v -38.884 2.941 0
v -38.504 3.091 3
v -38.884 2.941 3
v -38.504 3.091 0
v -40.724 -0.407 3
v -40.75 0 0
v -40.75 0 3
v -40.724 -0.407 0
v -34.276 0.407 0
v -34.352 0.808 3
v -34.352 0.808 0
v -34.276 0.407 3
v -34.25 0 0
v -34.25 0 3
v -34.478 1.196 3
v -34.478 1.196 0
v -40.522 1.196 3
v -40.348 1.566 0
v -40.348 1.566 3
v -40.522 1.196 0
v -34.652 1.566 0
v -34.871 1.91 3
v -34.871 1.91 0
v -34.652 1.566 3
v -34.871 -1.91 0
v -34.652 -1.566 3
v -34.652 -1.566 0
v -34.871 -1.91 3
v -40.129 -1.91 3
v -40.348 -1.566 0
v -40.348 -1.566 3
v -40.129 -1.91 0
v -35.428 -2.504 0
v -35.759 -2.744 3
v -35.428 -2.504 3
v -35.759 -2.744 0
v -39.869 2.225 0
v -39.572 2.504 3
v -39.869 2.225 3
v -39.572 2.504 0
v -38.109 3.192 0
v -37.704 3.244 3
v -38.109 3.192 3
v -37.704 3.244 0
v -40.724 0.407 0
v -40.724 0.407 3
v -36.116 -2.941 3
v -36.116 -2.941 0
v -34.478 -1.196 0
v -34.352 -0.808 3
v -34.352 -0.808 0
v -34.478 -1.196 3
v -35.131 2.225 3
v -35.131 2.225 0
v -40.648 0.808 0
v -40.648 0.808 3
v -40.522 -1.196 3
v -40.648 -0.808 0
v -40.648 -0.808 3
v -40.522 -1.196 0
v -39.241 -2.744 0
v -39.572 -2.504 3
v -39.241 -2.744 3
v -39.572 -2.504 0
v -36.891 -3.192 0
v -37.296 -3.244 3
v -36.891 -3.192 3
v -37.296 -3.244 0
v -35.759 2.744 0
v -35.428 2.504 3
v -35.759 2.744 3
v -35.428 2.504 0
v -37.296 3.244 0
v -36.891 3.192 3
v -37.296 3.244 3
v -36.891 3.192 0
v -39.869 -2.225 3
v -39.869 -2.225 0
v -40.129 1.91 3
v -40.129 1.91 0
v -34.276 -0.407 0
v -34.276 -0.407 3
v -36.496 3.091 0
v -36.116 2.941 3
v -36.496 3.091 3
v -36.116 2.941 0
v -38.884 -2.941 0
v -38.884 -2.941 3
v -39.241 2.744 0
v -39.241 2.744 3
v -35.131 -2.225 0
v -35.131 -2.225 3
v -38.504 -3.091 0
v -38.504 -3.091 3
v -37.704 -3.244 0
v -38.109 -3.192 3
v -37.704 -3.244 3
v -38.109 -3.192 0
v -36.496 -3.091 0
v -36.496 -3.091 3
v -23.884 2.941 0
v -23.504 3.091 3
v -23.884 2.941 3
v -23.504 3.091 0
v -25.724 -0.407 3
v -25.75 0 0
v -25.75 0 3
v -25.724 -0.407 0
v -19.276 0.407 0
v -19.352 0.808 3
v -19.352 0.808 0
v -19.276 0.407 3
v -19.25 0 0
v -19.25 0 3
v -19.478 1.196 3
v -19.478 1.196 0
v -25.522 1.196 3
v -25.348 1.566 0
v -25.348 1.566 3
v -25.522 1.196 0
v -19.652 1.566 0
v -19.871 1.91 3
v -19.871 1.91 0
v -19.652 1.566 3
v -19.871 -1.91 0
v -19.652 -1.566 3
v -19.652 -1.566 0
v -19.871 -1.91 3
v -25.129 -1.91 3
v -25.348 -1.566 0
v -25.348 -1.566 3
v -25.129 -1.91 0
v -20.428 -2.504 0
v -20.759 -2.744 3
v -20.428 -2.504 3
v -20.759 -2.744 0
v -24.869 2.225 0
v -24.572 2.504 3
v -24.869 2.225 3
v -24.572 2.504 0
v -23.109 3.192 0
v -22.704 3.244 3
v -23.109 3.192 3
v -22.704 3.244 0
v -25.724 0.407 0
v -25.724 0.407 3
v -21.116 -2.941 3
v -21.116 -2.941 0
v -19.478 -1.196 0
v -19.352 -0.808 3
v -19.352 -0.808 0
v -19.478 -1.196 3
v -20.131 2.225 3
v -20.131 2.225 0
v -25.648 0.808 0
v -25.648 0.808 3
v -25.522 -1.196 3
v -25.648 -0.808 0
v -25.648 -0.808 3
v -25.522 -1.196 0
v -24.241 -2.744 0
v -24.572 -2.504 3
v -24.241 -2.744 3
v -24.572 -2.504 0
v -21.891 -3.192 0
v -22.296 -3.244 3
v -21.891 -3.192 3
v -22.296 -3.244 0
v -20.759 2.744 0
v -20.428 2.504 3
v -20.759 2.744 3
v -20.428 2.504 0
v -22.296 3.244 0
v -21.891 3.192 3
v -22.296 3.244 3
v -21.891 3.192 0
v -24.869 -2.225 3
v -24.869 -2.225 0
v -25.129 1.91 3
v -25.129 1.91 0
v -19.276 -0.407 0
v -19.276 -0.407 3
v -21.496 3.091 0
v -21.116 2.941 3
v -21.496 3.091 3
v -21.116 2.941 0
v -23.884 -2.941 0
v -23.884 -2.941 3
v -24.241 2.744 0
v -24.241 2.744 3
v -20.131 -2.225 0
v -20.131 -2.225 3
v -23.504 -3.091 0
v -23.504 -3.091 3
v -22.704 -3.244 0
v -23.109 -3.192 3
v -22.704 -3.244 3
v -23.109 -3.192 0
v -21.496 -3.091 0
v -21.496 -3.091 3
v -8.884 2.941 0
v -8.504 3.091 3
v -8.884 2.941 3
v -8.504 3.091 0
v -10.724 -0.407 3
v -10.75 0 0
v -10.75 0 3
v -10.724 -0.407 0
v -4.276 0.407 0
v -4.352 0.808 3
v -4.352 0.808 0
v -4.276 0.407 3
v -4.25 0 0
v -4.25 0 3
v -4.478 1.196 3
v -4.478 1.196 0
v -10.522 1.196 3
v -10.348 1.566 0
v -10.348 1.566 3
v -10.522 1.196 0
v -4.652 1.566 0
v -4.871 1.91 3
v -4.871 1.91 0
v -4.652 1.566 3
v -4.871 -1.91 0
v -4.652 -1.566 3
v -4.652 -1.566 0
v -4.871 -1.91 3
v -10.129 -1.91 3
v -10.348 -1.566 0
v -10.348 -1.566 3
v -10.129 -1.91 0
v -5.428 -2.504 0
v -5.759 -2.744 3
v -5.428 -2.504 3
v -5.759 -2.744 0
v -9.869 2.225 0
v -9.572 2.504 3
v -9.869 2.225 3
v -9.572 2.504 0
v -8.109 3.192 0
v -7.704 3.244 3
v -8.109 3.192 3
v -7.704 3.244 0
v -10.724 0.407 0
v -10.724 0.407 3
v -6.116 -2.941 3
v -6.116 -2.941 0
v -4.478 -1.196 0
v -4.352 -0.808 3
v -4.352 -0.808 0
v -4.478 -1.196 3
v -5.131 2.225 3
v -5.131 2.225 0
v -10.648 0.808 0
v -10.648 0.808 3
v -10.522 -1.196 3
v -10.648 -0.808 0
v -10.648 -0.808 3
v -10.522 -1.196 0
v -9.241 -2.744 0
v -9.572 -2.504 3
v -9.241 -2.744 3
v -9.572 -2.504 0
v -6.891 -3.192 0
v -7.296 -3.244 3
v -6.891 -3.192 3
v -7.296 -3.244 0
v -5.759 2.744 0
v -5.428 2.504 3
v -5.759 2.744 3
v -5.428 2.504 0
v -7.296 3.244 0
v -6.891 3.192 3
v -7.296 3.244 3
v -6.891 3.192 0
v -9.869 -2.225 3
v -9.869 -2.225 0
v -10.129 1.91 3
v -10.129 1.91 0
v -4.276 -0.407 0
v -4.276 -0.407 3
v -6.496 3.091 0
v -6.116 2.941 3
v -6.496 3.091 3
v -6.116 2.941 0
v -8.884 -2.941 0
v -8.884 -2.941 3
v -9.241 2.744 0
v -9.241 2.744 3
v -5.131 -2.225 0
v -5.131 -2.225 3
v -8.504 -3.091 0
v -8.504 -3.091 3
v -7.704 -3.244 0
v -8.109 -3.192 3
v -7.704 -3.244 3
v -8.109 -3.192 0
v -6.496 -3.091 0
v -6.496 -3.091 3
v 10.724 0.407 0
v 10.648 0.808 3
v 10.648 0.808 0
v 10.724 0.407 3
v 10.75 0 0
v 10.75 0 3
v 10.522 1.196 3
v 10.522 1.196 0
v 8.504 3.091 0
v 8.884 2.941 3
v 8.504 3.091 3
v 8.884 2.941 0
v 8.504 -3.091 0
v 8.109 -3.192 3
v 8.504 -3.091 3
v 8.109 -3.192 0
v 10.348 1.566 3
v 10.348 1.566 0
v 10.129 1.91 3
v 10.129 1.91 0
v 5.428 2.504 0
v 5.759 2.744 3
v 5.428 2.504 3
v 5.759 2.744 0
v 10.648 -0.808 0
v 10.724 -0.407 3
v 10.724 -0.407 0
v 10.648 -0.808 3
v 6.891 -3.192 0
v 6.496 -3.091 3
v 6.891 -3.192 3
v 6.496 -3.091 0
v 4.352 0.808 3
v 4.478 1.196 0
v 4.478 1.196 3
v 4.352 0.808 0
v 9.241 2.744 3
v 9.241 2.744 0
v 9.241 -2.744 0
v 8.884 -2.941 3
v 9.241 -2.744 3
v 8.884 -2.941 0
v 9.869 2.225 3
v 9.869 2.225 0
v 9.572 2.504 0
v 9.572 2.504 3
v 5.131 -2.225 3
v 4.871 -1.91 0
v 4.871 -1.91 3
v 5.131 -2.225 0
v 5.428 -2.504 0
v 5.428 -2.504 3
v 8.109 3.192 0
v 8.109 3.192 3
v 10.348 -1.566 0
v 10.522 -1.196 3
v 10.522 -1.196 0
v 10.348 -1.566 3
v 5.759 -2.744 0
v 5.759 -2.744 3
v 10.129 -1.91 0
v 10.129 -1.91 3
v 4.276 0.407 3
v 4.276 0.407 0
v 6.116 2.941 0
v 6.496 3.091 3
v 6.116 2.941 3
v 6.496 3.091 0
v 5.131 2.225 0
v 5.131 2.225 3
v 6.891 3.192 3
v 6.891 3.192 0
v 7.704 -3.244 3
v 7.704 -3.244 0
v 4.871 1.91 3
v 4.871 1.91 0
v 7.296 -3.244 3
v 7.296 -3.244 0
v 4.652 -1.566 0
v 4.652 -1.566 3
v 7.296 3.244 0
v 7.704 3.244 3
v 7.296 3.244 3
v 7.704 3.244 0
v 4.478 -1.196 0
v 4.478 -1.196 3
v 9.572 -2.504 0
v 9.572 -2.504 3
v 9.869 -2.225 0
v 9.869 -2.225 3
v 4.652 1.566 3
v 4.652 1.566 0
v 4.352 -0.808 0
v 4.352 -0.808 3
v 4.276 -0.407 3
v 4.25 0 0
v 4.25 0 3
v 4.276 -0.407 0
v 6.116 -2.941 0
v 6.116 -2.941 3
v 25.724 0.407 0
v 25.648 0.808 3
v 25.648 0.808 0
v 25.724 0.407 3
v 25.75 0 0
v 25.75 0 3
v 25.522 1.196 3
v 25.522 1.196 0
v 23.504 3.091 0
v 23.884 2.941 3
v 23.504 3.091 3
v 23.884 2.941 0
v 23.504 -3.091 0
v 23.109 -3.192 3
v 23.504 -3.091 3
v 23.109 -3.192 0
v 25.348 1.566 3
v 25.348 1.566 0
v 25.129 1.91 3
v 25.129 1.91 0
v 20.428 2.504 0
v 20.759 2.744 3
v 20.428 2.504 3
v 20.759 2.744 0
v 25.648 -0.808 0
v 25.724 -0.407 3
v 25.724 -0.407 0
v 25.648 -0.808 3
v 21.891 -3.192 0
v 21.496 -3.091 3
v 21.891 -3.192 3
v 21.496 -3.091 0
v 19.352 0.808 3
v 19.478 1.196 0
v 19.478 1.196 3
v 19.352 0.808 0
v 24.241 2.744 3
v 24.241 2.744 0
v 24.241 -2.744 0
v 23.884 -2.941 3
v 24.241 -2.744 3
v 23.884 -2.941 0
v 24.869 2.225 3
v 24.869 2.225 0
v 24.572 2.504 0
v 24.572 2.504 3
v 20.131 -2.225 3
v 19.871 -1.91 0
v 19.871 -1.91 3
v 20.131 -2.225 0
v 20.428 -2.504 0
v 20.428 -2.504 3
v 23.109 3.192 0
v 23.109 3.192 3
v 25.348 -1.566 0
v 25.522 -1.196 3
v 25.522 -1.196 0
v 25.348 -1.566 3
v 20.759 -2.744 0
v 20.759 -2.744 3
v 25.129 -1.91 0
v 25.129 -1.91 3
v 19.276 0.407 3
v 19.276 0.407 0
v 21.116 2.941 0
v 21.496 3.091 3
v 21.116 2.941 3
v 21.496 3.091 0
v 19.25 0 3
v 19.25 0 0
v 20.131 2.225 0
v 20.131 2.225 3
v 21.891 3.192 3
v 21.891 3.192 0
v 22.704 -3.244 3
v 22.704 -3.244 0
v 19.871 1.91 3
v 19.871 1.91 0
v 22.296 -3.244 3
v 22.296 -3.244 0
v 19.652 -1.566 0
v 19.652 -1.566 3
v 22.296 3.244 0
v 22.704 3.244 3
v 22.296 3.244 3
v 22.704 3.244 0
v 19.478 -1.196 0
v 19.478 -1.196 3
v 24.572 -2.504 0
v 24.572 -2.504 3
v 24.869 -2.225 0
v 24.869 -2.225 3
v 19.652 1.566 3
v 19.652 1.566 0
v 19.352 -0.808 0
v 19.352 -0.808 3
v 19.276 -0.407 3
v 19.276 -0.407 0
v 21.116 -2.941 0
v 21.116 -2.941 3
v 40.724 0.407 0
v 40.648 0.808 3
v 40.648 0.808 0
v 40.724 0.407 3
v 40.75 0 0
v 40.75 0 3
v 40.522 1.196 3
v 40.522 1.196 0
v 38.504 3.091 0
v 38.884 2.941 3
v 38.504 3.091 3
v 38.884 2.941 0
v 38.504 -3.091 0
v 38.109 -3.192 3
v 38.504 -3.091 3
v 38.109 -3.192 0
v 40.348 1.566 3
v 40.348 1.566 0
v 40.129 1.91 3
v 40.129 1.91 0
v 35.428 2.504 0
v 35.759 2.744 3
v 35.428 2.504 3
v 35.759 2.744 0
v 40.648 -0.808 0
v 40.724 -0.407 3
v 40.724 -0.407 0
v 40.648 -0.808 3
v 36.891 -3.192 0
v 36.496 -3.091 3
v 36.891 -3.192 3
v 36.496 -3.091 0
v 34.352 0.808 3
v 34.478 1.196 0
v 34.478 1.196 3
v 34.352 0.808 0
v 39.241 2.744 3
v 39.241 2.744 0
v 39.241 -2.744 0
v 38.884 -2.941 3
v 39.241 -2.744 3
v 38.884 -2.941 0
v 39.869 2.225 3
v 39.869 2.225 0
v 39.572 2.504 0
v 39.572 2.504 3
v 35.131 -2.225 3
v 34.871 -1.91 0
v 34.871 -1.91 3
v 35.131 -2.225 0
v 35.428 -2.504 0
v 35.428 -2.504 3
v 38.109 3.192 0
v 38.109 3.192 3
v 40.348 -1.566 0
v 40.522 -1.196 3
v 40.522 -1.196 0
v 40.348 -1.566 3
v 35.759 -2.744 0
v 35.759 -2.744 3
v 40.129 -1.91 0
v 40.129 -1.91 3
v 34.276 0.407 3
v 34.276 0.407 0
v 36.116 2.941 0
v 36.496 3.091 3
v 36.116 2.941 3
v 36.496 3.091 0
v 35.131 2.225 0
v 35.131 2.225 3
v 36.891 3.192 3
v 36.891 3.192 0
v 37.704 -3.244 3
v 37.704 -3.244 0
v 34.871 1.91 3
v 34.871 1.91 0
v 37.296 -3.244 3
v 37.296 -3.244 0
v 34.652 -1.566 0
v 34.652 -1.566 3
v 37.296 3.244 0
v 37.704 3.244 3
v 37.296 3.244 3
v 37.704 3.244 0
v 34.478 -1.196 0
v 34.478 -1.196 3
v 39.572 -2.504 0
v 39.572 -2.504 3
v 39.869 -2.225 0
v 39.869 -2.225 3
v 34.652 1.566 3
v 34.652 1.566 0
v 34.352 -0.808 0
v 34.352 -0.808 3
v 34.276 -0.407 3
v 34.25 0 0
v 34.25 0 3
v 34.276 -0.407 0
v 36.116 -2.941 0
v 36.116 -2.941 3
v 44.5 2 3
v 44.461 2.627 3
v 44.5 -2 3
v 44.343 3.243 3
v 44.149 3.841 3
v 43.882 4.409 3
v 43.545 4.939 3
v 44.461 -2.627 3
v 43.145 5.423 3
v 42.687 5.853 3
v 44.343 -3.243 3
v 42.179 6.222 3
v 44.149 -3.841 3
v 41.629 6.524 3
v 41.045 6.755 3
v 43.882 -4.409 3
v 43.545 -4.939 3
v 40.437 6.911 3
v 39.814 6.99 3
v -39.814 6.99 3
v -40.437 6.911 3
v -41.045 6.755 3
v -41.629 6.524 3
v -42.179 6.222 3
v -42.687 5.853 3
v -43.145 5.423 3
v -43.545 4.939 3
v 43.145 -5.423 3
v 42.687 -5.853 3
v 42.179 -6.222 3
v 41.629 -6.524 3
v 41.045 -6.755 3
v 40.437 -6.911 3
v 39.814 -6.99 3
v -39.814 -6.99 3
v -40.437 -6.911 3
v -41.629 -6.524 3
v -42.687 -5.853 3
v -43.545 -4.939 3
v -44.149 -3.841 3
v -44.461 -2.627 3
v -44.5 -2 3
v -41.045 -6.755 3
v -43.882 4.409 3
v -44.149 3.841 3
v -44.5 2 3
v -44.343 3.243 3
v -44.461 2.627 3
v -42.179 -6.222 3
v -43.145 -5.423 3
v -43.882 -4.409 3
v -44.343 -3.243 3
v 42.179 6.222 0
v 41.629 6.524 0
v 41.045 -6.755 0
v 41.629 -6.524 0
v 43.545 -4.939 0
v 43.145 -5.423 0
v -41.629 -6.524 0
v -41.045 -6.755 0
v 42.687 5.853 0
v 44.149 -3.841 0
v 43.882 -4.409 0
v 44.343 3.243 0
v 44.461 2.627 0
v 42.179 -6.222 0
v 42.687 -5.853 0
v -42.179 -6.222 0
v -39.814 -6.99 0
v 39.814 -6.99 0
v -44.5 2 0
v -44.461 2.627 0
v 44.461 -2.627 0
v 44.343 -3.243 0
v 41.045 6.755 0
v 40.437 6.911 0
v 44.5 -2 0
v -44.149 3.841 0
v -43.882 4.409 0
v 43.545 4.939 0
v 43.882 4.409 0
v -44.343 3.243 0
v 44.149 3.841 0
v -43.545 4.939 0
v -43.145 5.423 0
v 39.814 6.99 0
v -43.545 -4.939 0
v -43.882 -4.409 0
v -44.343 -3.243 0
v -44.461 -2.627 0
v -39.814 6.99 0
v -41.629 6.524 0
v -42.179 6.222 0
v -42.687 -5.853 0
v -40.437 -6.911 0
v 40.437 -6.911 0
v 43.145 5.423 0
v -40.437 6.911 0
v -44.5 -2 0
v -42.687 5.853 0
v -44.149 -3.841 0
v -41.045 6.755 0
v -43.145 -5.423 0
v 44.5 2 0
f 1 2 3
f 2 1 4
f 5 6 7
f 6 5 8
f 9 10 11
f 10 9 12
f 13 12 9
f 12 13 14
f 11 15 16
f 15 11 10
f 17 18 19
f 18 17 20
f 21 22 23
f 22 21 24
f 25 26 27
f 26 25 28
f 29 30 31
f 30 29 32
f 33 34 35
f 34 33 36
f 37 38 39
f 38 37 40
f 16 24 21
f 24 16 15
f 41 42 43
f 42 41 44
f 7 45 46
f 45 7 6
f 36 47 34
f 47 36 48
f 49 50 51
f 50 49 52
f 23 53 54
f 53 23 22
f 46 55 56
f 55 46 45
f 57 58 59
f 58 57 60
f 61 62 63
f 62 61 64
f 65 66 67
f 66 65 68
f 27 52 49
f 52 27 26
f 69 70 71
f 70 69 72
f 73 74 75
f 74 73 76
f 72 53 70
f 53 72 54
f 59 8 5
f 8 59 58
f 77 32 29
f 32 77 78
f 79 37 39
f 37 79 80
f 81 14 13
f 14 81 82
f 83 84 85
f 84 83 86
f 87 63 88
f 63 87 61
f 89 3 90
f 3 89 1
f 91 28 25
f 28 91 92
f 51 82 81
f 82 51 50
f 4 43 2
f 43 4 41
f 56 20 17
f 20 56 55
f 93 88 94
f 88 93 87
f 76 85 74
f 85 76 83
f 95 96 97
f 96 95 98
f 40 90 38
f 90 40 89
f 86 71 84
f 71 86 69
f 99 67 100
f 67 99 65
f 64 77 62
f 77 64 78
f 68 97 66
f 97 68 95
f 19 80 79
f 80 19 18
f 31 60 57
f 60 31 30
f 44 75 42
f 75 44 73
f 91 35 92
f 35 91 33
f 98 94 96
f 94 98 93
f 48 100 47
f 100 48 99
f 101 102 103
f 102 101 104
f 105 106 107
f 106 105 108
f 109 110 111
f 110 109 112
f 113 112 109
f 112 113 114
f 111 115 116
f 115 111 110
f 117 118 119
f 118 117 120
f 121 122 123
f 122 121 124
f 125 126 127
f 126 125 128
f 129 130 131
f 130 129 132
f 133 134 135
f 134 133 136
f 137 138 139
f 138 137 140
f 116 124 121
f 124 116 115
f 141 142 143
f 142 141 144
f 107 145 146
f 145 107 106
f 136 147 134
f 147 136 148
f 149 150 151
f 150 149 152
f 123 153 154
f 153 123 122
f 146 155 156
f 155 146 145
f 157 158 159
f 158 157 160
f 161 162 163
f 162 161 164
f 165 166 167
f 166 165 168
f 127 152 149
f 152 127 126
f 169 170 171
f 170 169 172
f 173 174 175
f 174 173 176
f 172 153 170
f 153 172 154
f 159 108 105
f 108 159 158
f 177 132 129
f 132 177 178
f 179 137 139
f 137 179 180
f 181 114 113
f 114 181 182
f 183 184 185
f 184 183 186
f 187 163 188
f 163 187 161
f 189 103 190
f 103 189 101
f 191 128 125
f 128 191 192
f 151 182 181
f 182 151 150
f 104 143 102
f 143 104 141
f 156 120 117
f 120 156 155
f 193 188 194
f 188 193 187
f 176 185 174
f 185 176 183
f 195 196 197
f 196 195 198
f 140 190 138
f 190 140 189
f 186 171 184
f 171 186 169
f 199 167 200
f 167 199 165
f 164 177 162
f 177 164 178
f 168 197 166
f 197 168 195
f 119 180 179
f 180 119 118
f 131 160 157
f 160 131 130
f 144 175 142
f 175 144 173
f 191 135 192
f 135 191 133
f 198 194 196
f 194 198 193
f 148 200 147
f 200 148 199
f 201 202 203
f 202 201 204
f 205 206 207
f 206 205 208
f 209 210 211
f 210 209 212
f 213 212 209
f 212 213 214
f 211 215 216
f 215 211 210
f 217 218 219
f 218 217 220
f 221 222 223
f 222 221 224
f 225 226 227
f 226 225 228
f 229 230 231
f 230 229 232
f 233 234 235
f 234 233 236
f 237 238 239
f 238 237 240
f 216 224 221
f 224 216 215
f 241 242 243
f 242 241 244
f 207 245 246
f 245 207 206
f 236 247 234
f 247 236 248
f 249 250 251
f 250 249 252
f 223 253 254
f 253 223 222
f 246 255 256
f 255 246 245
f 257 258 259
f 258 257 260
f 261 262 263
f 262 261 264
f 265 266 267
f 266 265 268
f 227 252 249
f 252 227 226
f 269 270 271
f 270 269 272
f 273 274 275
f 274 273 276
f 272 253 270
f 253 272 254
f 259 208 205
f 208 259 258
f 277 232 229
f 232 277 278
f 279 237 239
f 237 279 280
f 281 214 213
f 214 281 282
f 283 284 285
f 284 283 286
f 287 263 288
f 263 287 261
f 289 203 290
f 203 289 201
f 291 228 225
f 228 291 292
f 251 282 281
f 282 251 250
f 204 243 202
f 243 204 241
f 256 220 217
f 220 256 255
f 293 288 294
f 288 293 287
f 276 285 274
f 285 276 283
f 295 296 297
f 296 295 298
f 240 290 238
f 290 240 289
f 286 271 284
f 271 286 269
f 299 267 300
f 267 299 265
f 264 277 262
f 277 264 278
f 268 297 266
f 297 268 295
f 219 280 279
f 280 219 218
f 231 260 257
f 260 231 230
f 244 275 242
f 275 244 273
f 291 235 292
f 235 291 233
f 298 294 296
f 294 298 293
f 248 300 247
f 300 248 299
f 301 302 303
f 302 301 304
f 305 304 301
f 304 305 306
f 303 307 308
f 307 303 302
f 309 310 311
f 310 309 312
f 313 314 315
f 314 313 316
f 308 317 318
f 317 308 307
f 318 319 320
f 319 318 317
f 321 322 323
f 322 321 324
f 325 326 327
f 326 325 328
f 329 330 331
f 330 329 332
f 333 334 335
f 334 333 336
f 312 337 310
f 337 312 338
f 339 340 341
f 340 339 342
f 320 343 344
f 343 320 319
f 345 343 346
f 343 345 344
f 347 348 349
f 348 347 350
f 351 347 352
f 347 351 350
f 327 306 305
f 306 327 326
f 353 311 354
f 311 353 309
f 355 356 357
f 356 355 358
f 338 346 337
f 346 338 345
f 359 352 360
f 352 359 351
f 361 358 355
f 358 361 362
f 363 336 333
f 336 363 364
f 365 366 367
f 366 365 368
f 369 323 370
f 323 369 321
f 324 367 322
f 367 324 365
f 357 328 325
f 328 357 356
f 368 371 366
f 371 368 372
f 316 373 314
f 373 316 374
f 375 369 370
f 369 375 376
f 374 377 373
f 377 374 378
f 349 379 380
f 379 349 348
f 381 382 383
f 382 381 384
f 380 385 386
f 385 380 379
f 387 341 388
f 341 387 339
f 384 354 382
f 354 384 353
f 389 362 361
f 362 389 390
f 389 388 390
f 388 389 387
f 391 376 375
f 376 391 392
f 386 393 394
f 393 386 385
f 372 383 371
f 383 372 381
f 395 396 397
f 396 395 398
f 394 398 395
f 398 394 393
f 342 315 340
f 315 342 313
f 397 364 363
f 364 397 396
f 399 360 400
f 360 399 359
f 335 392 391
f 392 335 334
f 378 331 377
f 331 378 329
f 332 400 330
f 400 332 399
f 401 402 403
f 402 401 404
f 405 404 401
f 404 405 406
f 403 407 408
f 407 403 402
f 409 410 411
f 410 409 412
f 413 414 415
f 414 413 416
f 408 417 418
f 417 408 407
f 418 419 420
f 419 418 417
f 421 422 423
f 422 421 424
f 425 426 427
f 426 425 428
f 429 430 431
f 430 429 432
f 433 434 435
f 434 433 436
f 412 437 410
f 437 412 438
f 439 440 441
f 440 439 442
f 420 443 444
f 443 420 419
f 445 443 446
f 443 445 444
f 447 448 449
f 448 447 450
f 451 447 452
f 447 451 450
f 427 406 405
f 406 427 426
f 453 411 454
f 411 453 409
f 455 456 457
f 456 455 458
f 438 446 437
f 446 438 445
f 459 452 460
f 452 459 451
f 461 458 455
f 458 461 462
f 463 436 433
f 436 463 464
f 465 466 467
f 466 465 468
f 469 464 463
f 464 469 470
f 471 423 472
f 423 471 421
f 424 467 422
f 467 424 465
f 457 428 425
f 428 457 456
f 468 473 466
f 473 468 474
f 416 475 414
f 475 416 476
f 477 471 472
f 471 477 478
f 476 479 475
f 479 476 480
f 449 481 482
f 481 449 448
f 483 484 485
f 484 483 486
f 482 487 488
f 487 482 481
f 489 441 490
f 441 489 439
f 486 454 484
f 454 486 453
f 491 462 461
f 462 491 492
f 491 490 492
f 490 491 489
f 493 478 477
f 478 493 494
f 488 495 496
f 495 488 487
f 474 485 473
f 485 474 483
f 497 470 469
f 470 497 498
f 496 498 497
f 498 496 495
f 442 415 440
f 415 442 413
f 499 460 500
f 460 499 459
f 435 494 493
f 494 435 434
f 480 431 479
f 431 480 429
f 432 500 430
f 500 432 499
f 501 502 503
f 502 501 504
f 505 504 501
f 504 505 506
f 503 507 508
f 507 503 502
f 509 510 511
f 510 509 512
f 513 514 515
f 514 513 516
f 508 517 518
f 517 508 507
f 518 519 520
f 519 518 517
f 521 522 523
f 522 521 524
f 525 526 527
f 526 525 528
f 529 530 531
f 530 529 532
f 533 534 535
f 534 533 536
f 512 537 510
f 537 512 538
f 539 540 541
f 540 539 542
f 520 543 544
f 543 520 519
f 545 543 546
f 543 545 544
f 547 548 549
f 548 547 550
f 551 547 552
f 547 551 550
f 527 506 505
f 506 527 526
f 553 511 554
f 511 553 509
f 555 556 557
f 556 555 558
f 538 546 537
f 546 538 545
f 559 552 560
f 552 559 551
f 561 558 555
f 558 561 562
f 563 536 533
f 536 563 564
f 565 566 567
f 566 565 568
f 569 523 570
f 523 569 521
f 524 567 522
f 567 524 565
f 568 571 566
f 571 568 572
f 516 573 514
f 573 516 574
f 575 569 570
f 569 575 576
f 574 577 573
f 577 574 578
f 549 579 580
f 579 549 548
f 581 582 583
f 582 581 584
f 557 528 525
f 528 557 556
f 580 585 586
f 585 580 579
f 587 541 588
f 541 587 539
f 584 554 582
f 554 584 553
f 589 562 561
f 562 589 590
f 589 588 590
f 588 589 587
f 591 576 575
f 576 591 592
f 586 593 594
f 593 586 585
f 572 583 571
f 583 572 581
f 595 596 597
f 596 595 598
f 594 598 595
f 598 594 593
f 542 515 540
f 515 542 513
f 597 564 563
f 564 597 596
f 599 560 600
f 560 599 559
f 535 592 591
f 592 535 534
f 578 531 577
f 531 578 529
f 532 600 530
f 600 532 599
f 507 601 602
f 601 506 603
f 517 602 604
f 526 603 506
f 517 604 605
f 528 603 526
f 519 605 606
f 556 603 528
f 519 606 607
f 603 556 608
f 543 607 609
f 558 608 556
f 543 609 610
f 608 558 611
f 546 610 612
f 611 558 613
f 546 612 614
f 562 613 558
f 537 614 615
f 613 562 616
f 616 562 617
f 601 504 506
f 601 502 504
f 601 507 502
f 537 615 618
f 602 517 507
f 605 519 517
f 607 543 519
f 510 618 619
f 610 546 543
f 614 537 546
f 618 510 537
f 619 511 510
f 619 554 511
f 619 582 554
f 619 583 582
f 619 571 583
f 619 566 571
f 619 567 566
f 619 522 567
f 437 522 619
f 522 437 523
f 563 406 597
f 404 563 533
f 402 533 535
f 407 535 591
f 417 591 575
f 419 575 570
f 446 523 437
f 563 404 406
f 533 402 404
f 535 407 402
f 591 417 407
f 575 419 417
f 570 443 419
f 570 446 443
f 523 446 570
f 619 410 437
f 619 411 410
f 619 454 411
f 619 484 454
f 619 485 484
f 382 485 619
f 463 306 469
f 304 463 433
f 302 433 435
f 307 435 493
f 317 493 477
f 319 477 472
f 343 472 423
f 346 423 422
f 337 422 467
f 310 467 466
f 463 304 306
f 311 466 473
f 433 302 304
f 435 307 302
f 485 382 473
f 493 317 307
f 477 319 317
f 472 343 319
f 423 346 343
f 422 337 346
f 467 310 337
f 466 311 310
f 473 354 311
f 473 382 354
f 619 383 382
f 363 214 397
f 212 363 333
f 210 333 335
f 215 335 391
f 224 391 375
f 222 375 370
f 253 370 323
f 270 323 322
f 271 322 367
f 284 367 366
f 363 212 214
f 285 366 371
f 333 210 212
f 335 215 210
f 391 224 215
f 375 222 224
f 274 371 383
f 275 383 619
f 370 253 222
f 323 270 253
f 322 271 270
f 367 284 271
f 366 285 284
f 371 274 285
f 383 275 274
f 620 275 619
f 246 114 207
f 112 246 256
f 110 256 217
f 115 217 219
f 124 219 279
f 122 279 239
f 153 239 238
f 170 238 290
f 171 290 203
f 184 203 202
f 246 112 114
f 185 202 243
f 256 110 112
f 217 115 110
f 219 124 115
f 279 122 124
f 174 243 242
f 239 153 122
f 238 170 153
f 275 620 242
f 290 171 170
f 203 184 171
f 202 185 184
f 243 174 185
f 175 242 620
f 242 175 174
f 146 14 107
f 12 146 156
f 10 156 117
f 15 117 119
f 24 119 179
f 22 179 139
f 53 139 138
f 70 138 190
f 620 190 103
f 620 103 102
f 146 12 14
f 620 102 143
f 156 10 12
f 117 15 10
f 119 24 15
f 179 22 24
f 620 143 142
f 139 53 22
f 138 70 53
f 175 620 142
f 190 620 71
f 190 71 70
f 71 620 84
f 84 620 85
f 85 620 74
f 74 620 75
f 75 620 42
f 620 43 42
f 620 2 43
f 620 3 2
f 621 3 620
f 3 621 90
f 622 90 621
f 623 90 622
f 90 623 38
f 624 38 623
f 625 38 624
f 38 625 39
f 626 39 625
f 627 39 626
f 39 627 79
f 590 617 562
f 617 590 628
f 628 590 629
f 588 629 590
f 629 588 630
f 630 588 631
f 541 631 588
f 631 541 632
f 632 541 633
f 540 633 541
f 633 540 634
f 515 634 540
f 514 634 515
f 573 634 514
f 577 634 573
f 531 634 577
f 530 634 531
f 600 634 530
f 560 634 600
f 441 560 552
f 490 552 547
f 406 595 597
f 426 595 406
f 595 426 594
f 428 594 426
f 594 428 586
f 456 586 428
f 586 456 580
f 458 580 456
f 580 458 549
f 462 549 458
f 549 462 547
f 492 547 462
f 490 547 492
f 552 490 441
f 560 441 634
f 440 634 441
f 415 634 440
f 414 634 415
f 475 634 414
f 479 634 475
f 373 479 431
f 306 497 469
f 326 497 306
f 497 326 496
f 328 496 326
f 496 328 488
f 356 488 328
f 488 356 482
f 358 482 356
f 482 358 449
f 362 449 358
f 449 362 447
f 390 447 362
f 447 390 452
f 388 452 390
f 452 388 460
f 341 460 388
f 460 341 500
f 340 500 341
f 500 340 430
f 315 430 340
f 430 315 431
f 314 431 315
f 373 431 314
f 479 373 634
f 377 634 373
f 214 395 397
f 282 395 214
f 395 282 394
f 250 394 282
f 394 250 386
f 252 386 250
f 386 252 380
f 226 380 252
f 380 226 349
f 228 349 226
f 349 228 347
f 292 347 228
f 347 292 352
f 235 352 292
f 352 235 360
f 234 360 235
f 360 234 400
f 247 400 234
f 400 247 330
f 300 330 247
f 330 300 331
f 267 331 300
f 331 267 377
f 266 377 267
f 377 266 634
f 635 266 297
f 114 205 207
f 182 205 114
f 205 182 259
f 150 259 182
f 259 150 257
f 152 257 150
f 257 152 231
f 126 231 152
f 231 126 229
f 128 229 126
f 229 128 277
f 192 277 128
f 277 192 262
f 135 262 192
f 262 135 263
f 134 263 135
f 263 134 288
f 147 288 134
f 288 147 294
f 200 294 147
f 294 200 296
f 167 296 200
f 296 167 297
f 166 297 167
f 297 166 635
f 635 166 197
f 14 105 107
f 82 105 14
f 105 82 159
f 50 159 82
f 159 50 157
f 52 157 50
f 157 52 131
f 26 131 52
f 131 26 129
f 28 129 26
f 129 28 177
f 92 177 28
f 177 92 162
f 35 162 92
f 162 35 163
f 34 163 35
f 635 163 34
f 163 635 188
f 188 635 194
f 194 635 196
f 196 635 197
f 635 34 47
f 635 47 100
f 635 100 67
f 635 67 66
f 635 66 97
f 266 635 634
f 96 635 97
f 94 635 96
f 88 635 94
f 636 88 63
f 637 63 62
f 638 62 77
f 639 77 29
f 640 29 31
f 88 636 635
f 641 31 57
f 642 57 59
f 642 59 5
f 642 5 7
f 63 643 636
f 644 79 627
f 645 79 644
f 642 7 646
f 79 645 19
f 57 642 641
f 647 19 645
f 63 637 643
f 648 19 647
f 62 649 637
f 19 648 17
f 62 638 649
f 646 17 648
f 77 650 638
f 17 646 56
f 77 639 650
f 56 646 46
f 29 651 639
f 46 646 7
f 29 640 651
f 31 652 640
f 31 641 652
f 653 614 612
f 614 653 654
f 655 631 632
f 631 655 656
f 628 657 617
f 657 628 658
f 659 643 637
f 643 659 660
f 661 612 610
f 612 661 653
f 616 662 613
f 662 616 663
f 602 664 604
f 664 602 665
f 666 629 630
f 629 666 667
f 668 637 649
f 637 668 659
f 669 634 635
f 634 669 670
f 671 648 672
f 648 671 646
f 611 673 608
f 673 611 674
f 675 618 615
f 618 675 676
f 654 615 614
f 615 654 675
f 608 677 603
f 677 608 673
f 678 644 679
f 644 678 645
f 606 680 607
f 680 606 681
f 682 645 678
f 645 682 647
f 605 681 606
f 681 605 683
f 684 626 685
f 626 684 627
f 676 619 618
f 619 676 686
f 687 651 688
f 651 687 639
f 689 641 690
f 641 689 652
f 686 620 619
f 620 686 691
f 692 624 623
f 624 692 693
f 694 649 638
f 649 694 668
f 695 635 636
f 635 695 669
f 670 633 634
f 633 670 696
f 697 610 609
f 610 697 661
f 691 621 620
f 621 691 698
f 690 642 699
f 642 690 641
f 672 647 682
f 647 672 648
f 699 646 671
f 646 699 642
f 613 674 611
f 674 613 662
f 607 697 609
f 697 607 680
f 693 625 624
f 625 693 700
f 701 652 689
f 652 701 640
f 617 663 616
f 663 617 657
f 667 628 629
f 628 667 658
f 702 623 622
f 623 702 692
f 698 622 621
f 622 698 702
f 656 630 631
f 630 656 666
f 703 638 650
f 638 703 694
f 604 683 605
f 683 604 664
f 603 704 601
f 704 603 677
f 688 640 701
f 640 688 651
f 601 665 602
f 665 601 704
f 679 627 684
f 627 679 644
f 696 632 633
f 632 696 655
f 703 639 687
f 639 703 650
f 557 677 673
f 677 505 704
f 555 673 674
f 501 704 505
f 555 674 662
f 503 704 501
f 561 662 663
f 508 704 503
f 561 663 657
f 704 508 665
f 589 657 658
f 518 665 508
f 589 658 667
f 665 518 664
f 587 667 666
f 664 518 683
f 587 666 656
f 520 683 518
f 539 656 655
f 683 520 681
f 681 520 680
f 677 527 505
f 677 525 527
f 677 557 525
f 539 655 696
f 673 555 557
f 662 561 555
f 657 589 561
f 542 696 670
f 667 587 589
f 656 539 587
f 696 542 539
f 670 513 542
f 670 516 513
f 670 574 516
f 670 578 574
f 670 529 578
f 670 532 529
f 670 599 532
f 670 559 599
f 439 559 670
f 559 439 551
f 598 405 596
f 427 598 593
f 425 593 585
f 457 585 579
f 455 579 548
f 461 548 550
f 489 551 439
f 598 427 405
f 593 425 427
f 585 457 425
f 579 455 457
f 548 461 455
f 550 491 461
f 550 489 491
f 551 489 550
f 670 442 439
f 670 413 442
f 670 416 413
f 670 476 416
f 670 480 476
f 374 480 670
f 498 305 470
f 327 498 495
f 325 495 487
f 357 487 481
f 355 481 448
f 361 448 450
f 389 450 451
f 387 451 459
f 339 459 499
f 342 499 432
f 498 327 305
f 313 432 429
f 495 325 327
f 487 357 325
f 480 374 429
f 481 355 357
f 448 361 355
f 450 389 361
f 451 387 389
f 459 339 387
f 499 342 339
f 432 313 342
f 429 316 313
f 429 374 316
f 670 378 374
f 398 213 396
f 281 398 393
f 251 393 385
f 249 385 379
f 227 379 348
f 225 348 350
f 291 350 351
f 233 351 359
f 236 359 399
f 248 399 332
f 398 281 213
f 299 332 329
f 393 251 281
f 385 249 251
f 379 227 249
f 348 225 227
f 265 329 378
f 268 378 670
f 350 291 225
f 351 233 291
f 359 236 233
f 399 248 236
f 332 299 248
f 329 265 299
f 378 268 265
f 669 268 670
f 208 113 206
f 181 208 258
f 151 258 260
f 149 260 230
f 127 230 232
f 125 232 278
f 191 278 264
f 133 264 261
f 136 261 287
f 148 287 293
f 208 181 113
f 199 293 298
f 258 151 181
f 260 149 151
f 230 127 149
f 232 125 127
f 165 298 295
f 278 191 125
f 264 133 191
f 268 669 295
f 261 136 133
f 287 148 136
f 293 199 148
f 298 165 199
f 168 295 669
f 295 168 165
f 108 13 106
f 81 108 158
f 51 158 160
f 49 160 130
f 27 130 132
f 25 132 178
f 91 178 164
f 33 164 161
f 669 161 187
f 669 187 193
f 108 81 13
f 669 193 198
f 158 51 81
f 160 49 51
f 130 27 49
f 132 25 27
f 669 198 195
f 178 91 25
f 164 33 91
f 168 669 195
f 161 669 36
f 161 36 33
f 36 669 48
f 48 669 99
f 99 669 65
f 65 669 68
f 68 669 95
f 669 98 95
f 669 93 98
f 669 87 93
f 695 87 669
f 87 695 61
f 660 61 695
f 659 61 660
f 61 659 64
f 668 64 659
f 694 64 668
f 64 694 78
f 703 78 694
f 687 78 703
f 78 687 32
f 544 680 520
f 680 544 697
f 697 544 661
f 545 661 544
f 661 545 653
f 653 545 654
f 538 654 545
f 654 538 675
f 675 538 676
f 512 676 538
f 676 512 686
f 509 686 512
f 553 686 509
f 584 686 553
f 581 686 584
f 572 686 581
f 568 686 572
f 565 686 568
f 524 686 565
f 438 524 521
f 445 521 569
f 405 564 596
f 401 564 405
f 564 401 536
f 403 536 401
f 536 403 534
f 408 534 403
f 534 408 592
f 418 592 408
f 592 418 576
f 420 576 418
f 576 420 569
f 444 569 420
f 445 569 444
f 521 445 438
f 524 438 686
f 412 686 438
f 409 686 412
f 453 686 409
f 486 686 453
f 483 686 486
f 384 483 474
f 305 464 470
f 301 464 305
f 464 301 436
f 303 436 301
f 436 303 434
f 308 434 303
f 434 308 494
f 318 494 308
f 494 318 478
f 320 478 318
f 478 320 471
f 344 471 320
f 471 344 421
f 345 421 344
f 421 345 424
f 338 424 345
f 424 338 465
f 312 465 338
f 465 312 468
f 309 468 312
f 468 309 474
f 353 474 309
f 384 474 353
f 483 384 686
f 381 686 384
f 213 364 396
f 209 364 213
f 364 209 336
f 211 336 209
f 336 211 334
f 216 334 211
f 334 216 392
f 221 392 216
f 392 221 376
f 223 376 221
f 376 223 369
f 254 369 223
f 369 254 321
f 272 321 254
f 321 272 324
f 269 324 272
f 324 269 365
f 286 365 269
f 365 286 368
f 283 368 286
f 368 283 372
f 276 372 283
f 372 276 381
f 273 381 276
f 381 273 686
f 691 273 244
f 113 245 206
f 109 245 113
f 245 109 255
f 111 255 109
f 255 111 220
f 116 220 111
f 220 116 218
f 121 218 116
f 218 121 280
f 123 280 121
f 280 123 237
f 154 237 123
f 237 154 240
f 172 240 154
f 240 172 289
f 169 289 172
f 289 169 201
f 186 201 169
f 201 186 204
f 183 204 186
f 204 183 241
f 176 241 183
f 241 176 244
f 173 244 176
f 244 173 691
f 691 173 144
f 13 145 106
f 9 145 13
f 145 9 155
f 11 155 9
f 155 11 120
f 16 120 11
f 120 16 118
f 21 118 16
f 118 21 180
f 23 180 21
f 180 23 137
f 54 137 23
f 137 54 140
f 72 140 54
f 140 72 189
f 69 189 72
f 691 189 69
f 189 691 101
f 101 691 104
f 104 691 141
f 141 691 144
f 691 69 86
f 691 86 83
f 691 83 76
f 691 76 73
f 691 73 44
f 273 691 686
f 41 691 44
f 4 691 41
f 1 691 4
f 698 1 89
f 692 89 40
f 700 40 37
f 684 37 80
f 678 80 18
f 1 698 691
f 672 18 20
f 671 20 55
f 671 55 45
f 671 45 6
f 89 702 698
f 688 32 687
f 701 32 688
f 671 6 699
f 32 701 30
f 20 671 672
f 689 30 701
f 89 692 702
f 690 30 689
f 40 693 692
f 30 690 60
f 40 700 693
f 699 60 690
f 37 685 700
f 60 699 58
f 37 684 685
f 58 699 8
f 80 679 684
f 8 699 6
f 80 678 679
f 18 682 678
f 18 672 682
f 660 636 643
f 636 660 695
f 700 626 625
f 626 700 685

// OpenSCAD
// Generated by SolidPython 1.1.3 on 2023-03-12 22:16:50
$fn = 50;


difference() {
	union() {
		translate(v = [0, 0, 0]) {
			rotate(a = [0, 0, 0]) {
				hull() {
					translate(v = [-39.5000000000, 2.0000000000, 0]) {
						rotate(a = [0, 0, 0]) {
							translate(v = [0, 0, 0]) {
								rotate(a = [0, 0, 0]) {
									cylinder(h = 3, r = 5);
								}
							}
						}
					}
					translate(v = [39.5000000000, 2.0000000000, 0]) {
						rotate(a = [0, 0, 0]) {
							translate(v = [0, 0, 0]) {
								rotate(a = [0, 0, 0]) {
									cylinder(h = 3, r = 5);
								}
							}
						}
					}
					translate(v = [-39.5000000000, -2.0000000000, 0]) {
						rotate(a = [0, 0, 0]) {
							translate(v = [0, 0, 0]) {
								rotate(a = [0, 0, 0]) {
									cylinder(h = 3, r = 5);
								}
							}
						}
					}
					translate(v = [39.5000000000, -2.0000000000, 0]) {
						rotate(a = [0, 0, 0]) {
							translate(v = [0, 0, 0]) {
								rotate(a = [0, 0, 0]) {
									cylinder(h = 3, r = 5);
								}
							}
						}
					}
				}
			}
		}
	}
	union() {
		translate(v = [-37.5000000000, 0.0000000000, 0]) {
			rotate(a = [0, 0, 0]) {
				translate(v = [0, 0, -50]) {
					rotate(a = [0, 0, 0]) {
						cylinder(h = 100, r = 3.2500000000);
					}
				}
			}
		}
		translate(v = [-22.5000000000, 0.0000000000, 0]) {
			rotate(a = [0, 0, 0]) {
				translate(v = [0, 0, -50]) {
					rotate(a = [0, 0, 0]) {
						cylinder(h = 100, r = 3.2500000000);
					}
				}
			}
		}
		translate(v = [-7.5000000000, 0.0000000000, 0]) {
			rotate(a = [0, 0, 0]) {
				translate(v = [0, 0, -50]) {
					rotate(a = [0, 0, 0]) {
						cylinder(h = 100, r = 3.2500000000);
					}
				}
			}
		}
		translate(v = [7.5000000000, 0.0000000000, 0]) {
			rotate(a = [0, 0, 0]) {
				translate(v = [0, 0, -50]) {
					rotate(a = [0, 0, 0]) {
						cylinder(h = 100, r = 3.2500000000);
					}
				}
			}
		}
		translate(v = [22.5000000000, 0.0000000000, 0]) {
			rotate(a = [0, 0, 0]) {
				translate(v = [0, 0, -50]) {
					rotate(a = [0, 0, 0]) {
						cylinder(h = 100, r = 3.2500000000);
					}
				}
			}
		}
		translate(v = [37.5000000000, 0.0000000000, 0]) {
			rotate(a = [0, 0, 0]) {
				translate(v = [0, 0, -50]) {
					rotate(a = [0, 0, 0]) {
						cylinder(h = 100, r = 3.2500000000);
					}
				}
			}
		}
	}
}
/***********************************************
*********      SolidPython code:      **********
************************************************
 
from solid import *
import os
import subprocess

import oomB

import opsc_library_gen

mode = "laser"
#mode = "3d_print"

defined_objects = {}

radius_dict = {}
countersunk_dict = {}


def set_mode(m):
    global mode
    mode = m
    radius_dict['M6'] = 6.5/2
    radius_dict['M3'] = 3.3/2
    if mode == "laser":
        radius_dict['M6'] = 6/2
        radius_dict['M3'] = 3/2

    countersunk_dict['M3'] = {}
    countersunk_dict['M3']['little_rad'] = radius_dict['M3']
    countersunk_dict['M3']['big_rad'] = (5.5+0.6)/2
    if mode == "laser":
        countersunk_dict['M3']['big_rad'] = (4.75+0.6)/2
        countersunk_dict['M3']['little_rad'] = (4.75+0.6)/2

    countersunk_dict['M3']['height'] = 1.7


def opsc_make_object(filename, objects, save_type="none",resolution=50, layers = 1, tilediff = 200, mode="laser", overwrite=True):
    if overwrite or not os.path.exists(filename):
        set_mode(mode)
        save_type = save_type.lower()
        os.makedirs(os.path.dirname(filename), exist_ok=True)
        final_object = opsc_get_object(objects, mode = mode)
        # Save the final object to the specified filename    
        scad_render_to_file(final_object, filename, file_header='$fn = %s;' % resolution, include_orig_code=True)
        if mode == "laser":
            filename_laser = filename.replace(".scad","-flat.scad")
            scad_render_to_file(getLaser(final_object, layers=layers, tilediff=tilediff), filename_laser, file_header='$fn = %s;' % resolution, include_orig_code=True)
            if save_type == "all":
                saveToAll(filename_laser)
            elif save_type == "dxf":
                saveToDxf(filename_laser)
        if save_type == "all":
            saveToAll(filename)
        elif save_type == "dxf":
            saveToDxf(filename)


def opsc_get_object(objects, mode = "laser"):
    # Create the solidpython objects only include the positive objects and if they don't have inclusion or their inclusion is either all or mode
    # Initialize an empty list to store the results
    positive_objects = []

    # Iterate over the "objects" list
    for obj in objects:
        # Check if the current object has a "type" key with a value of "positive"
        if obj['type'] == 'positive':
            # Check if the current object has an "inclusion" key and its value matches "mode",
            # or if the current object does not have an "inclusion" key at all
            if not 'inclusion' in obj or obj['inclusion'] == "all" or obj['inclusion'] == mode:
                # Call the "get_opsc_item" function with the current object as an argument
                opsc_item = get_opsc_item(obj)
                # Add the result to the "positive_objects" list
                positive_objects.append(opsc_item)
# Initialize an empty list to store the results
    negative_objects = []

    # Iterate over the "objects" list
    for obj in objects:
        # Check if the current object has a "type" key with a value of "negative"
        if obj['type'] == 'negative':
            # Check if the current object has an "inclusion" key and its value matches "mode",
            # or if the current object does not have an "inclusion" key at all
            if not 'inclusion' in obj or obj['inclusion'] == "all" or obj['inclusion'] == mode:
                # Call the "get_opsc_item" function with the current object as an argument
                opsc_item = get_opsc_item(obj)
                # Add the result to the "negative_objects" list
                negative_objects.append(opsc_item)
    
    #positive_objects = [get_opsc_item(obj) for obj in objects if obj['type'] == 'positive']
    #negative_objects = [get_opsc_item(obj) for obj in objects if obj['type'] == 'negative']
    # Union the positive objects
    positive_object = union()(*positive_objects)
    # Union the negative objects
    negative_object = union()(*negative_objects)
    # Create the final object by subtracting the negative objects from the positive objects
    return difference()(positive_object, negative_object)

def get_opsc_item(params):
    # A dictionary to map radius string values to numerical values
    #radius_dict = {'small': 5, 'medium': 10, 'large': 15}
    # An array of function names for basic shapes
    basic_shapes = ['cube', 'sphere', 'cylinder']
    
    # An array of function names for other shapes
    other_shapes = ['hole', 'slot', 'rounded_rectangle', 'countersunk']
    


    # Convert radius to r if present, and remove radius from the params dictionary
    if 'radius' in params:
        if isinstance(params['radius'], str):
            # Use the radius_dict to map the radius string value to a numerical value
            params['r'] = radius_dict[params['radius']]
        else:
            params['r'] = params['radius']
        del params['radius']
    

    # Check if the object type is a basic shape
    if params['shape'] in basic_shapes:
        # Remove shape and unexpected dictionary values
        allowed_keys = {'size', 'r', 'r1', 'r2', 'd', 'h', 'rw', 'rh', 'dw', 'dh'}
        shape_params = {k: v for k, v in params.items() if k in allowed_keys}

        # Call the corresponding function for the shape parameter, using ** notation to pass the shape_params dictionary as keyword arguments
        return get_opsc_transform(params,globals()[params['shape']](**shape_params))
    
    # If the object type is not a basic shape, check if it's a defined object or one of the other shapes
    elif params['shape'] in other_shapes:
        # Call the corresponding function for the shape parameter, passing the params dictionary as an argument
        p2 = copy.deepcopy(params)
        p2["pos"] = [0,0,0]
        return get_opsc_transform(params,globals()[params['shape']](p2))
    
    # If the object is not a basic shape or a defined object, try to import it from a .scad file
    else:
        obj = defined_objects[params['shape']]
        return get_opsc_transform(params,obj)

def get_opsc_transform(params, solid_obj):
    # Rotate the object based on the 'rot' field in the params dictionary, or the 'rotX', 'rotY', and 'rotZ' fields if 'rot' is not present
    rot = params.get('rot', [])
    if rot:
        rotX, rotY, rotZ = rot
    else:
        rotX = params.get('rotX', 0)
        rotY = params.get('rotY', 0)
        rotZ = params.get('rotZ', 0)
    solid_obj = rotate([rotX, rotY, rotZ])(solid_obj)

    # Translate the object based on the 'pos' field in the params dictionary, or the 'x', 'y', and 'z' fields if 'pos' is not present
    pos = params.get('pos', [])
    if pos:
        x, y, z = pos
    else:
        x = params.get('x', 0)
        y = params.get('y', 0)
        z = params.get('z', 0)
    solid_obj = translate([x, y, z])(solid_obj)
    return solid_obj


import random

def opsc_easy_array(type, shape, repeats, pos_start, shift_arr, **kwargs):
    for i in range(0,3):
        repeats.append(1)
        pos_start.append(0)
        shift_arr.append(0)
    return_objects = []

    for x in range(0,repeats[0]):
        for y in range(0,repeats[1]):
            for z in range(0,repeats[2]):
                return_objects.append(opsc_easy(type, shape, pos=[pos_start[0]+x*shift_arr[0],pos_start[1]+y*shift_arr[1],pos_start[2]+z*shift_arr[2]], **kwargs))
    return return_objects                



def opsc_easy(type, shape, **kwargs):
    obj = {
        'type': type,
        'shape': shape
    }
    for param in ['size', 'r', 'r1', 'r2', 'd', 'h', 'rw', 'rh', 'dw', 'dh', 'pos', 'x', 'y', 'z', 'rot', 'rotX', 'rotY', 'rotZ', "w", "inclusion"]:
        if param in kwargs:
            obj[param] = kwargs[param]
    return obj

def hole(params):
    p2 = copy.deepcopy(params)  
    # Check if the radius is a string and replace it with the corresponding value from the dictionary
    if isinstance(p2['r'], str):
        p2['r'] = radius_dict[p2['r']]
    
    # Set the height to 100 if not specified
    if 'h' not in p2:
        p2['h'] = 100
        p2["pos"] = [0,0,-50]
    p2["center"] = True
    # Create the cylinder object
    p2["shape"] = "cylinder"
    p2["type"] = "positive"

    return get_opsc_item(p2)

import copy

def countersunk(params):
    p2 = copy.deepcopy(params)
    counter_rad = p2['r']
    p2['r'] = radius_dict[p2['r']]
    hp = copy.deepcopy(p2)
    hp["type"] = "positive"
    hp["shape"] = "hole"
    del hp["rot"]
    hol = get_opsc_item(hp)
    
    cp = copy.deepcopy(p2)
    cp["h"] = countersunk_dict[counter_rad]["height"]
    cp["r2"] = countersunk_dict[counter_rad]["little_rad"]
    cp["r1"] = countersunk_dict[counter_rad]["big_rad"]
    del cp["r"]
    del cp["rot"]
    cp["type"] = "positive"
    cp["shape"] = "cylinder"
    cp["pos"] = [0,0,0]

    top = get_opsc_item(cp)
    return union()(hol,top)



def slot(params):  
    p2 = copy.deepcopy(params) 
    if isinstance(p2['r'], str):
        p2['r'] = radius_dict[p2['r']]
    p2["type"] = "positive"
    p2["shape"] = "hole"
    del p2["rot"]
    p2["pos"] = [0,0,0]
    left = copy.deepcopy(p2)
    right = copy.deepcopy(p2)
    left["pos"][0] = p2["w"] / 2 - p2["r"] 
    
    right["pos"][0] = -p2["w"] / 2 + p2["r"] 
    pass
    leftObj = get_opsc_item(left)
    rightObj = get_opsc_item(right)
    return hull()(leftObj, rightObj)

def rounded_rectangle(params):   
    p2 = copy.deepcopy(params) 
    p2["h"] = p2["size"][2]
    p2["pos"] = p2.get("pos", [0, 0, 0]) 
    p2["type"] = "positive"
    p2["shape"] = "hole"
    p2["pos"] = [0,0,0]
    
    if 'rot' in p2:
        del p2["rot"]   
    if 'r' not in p2:
        p2["r"] = 5 
    tl = copy.deepcopy(p2)
    tr = copy.deepcopy(p2)
    bl = copy.deepcopy(p2)
    br = copy.deepcopy(p2)
    tl["pos"][0] = -(p2["size"][0] - p2["r"]*2)/2
    tl["pos"][1] = (p2["size"][1] - p2["r"]*2)/2
    tr["pos"][0] = (p2["size"][0] - p2["r"]*2)/2
    tr["pos"][1] = (p2["size"][1] - p2["r"]*2)/2
    bl["pos"][0] = -(p2["size"][0] - p2["r"]*2)/2
    bl["pos"][1] = -(p2["size"][1] - p2["r"]*2)/2
    br["pos"][0] = (p2["size"][0] - p2["r"]*2)/2
    br["pos"][1] = -(p2["size"][1] - p2["r"]*2)/2
    del tl["size"]
    del tr["size"]
    del bl["size"]
    del br["size"]
    tlo = get_opsc_item(tl)
    tro = get_opsc_item(tr)
    blo = get_opsc_item(bl)
    bro = get_opsc_item(br)    
    return hull()(tlo, tro, blo, bro)



def import_scad_object(filename):
    # Import the .scad file and convert it to a solidpython object
    #filename = "parts"
    obj = import_scad(filename)
    return obj.main()
    


import os
import solid as solidpython

# A dictionary to store the defined objects


def load_scad_objects():
    opsc_library_gen.gen_library(defined_objects)

import random

def test(num_objects):
    objects = []
    for i in range(num_objects):
        # Choose a random shape
        #shape = random.choice(['cube', 'sphere', 'cylinder', 'hole', 'slot', "rounded_rectangle"])
        shape = random.choice(["rounded_rectangle"])

        # Choose a random type
        type = random.choice(['positive', 'negative'])
        
        # Create an empty object dictionary
        obj = {'shape': shape, 'type': type}
        
        # Set shape-specific parameters
        if obj['shape'] in ['cube']:
            obj['size'] =  [random.uniform(5, 15), random.uniform(5, 15), random.uniform(5, 15)]
        if obj['shape'] in ['rounded_rectangle']:
            obj['size'] =  [random.uniform(5, 15), random.uniform(5, 15), random.uniform(5, 15)]
            obj['r'] = random.uniform(0.5, 5)
        elif obj['shape'] == 'sphere':
            obj['r'] = random.uniform(5, 15)
        elif obj['shape'] in ['cylinder', 'hole']:
            obj['r'] = random.uniform(0.5, 5)
            obj['h'] = random.uniform(5, 15)
        elif obj['shape'] == 'slot':
            obj['r'] = random.uniform(0.5, 5)
            obj['h'] = random.uniform(5, 15)
            obj['w'] = random.uniform(5, 15)
        
        # Set a random position and rotation
        obj['pos'] = [random.uniform(-20, 20), random.uniform(-20, 20), random.uniform(-20, 20)]
        obj['rot'] = [random.uniform(-180, 180), random.uniform(-180, 180), random.uniform(-180, 180)]
        
        # Add the object to the list
        objects.append(obj)
    return objects

####### old file saving
def saveToAll(fileIn):
    saveToDxf(fileIn)
    saveToPng(fileIn)
    saveToStl(fileIn)
    saveToSvg(fileIn)

def saveToDxf(fileIn, fileOut="", copy_to_laser=True):
    if fileOut == "":
        fileOut = fileIn.replace(".scad",".dxf")
    saveToFile(fileIn, fileOut)


    
def saveToPng(fileIn, fileOut="",extra="--render"):
    if fileOut == "":
        fileOut = fileIn.replace(".scad",".png")
    saveToFile(fileIn, fileOut)

def saveToStl(fileIn, fileOut=""):
    if fileOut == "":
        fileOut = fileIn.replace(".scad",".stl")
    saveToFile(fileIn, fileOut)
    
def saveToSvg(fileIn, fileOut=""):
    if fileOut == "":
        fileOut = fileIn.replace(".scad",".svg")
    saveToFile(fileIn, fileOut)

def saveToFile(fileIn, fileOut,extra=""):
    #extra = extra + " --colorscheme Tomorrow"

    launchStr = 'openscad -o "' + fileOut + '"' + extra + ' "' + fileIn + '"'
    if ".png" in fileOut:
        launchStr = launchStr + " --render"
    print("            saveToFile launch string: " + launchStr)
    subprocess.run(launchStr)
    x=0

def getLaser(final_object,start=1.5,layers=1,thickness=3,tilediff=200):
        rv= []

        for x in range(layers):
            rv.append(translate([0,x*tilediff,0])(
                    projection()(
                        intersection()(translate([-500,-500,start+x*thickness])(cube(size=[1000,1000,0.1])),
                            final_object
                        )
                    )
            )
            )
            
        return union()(rv)

set_mode("laser")
load_scad_objects() 
 
************************************************/
